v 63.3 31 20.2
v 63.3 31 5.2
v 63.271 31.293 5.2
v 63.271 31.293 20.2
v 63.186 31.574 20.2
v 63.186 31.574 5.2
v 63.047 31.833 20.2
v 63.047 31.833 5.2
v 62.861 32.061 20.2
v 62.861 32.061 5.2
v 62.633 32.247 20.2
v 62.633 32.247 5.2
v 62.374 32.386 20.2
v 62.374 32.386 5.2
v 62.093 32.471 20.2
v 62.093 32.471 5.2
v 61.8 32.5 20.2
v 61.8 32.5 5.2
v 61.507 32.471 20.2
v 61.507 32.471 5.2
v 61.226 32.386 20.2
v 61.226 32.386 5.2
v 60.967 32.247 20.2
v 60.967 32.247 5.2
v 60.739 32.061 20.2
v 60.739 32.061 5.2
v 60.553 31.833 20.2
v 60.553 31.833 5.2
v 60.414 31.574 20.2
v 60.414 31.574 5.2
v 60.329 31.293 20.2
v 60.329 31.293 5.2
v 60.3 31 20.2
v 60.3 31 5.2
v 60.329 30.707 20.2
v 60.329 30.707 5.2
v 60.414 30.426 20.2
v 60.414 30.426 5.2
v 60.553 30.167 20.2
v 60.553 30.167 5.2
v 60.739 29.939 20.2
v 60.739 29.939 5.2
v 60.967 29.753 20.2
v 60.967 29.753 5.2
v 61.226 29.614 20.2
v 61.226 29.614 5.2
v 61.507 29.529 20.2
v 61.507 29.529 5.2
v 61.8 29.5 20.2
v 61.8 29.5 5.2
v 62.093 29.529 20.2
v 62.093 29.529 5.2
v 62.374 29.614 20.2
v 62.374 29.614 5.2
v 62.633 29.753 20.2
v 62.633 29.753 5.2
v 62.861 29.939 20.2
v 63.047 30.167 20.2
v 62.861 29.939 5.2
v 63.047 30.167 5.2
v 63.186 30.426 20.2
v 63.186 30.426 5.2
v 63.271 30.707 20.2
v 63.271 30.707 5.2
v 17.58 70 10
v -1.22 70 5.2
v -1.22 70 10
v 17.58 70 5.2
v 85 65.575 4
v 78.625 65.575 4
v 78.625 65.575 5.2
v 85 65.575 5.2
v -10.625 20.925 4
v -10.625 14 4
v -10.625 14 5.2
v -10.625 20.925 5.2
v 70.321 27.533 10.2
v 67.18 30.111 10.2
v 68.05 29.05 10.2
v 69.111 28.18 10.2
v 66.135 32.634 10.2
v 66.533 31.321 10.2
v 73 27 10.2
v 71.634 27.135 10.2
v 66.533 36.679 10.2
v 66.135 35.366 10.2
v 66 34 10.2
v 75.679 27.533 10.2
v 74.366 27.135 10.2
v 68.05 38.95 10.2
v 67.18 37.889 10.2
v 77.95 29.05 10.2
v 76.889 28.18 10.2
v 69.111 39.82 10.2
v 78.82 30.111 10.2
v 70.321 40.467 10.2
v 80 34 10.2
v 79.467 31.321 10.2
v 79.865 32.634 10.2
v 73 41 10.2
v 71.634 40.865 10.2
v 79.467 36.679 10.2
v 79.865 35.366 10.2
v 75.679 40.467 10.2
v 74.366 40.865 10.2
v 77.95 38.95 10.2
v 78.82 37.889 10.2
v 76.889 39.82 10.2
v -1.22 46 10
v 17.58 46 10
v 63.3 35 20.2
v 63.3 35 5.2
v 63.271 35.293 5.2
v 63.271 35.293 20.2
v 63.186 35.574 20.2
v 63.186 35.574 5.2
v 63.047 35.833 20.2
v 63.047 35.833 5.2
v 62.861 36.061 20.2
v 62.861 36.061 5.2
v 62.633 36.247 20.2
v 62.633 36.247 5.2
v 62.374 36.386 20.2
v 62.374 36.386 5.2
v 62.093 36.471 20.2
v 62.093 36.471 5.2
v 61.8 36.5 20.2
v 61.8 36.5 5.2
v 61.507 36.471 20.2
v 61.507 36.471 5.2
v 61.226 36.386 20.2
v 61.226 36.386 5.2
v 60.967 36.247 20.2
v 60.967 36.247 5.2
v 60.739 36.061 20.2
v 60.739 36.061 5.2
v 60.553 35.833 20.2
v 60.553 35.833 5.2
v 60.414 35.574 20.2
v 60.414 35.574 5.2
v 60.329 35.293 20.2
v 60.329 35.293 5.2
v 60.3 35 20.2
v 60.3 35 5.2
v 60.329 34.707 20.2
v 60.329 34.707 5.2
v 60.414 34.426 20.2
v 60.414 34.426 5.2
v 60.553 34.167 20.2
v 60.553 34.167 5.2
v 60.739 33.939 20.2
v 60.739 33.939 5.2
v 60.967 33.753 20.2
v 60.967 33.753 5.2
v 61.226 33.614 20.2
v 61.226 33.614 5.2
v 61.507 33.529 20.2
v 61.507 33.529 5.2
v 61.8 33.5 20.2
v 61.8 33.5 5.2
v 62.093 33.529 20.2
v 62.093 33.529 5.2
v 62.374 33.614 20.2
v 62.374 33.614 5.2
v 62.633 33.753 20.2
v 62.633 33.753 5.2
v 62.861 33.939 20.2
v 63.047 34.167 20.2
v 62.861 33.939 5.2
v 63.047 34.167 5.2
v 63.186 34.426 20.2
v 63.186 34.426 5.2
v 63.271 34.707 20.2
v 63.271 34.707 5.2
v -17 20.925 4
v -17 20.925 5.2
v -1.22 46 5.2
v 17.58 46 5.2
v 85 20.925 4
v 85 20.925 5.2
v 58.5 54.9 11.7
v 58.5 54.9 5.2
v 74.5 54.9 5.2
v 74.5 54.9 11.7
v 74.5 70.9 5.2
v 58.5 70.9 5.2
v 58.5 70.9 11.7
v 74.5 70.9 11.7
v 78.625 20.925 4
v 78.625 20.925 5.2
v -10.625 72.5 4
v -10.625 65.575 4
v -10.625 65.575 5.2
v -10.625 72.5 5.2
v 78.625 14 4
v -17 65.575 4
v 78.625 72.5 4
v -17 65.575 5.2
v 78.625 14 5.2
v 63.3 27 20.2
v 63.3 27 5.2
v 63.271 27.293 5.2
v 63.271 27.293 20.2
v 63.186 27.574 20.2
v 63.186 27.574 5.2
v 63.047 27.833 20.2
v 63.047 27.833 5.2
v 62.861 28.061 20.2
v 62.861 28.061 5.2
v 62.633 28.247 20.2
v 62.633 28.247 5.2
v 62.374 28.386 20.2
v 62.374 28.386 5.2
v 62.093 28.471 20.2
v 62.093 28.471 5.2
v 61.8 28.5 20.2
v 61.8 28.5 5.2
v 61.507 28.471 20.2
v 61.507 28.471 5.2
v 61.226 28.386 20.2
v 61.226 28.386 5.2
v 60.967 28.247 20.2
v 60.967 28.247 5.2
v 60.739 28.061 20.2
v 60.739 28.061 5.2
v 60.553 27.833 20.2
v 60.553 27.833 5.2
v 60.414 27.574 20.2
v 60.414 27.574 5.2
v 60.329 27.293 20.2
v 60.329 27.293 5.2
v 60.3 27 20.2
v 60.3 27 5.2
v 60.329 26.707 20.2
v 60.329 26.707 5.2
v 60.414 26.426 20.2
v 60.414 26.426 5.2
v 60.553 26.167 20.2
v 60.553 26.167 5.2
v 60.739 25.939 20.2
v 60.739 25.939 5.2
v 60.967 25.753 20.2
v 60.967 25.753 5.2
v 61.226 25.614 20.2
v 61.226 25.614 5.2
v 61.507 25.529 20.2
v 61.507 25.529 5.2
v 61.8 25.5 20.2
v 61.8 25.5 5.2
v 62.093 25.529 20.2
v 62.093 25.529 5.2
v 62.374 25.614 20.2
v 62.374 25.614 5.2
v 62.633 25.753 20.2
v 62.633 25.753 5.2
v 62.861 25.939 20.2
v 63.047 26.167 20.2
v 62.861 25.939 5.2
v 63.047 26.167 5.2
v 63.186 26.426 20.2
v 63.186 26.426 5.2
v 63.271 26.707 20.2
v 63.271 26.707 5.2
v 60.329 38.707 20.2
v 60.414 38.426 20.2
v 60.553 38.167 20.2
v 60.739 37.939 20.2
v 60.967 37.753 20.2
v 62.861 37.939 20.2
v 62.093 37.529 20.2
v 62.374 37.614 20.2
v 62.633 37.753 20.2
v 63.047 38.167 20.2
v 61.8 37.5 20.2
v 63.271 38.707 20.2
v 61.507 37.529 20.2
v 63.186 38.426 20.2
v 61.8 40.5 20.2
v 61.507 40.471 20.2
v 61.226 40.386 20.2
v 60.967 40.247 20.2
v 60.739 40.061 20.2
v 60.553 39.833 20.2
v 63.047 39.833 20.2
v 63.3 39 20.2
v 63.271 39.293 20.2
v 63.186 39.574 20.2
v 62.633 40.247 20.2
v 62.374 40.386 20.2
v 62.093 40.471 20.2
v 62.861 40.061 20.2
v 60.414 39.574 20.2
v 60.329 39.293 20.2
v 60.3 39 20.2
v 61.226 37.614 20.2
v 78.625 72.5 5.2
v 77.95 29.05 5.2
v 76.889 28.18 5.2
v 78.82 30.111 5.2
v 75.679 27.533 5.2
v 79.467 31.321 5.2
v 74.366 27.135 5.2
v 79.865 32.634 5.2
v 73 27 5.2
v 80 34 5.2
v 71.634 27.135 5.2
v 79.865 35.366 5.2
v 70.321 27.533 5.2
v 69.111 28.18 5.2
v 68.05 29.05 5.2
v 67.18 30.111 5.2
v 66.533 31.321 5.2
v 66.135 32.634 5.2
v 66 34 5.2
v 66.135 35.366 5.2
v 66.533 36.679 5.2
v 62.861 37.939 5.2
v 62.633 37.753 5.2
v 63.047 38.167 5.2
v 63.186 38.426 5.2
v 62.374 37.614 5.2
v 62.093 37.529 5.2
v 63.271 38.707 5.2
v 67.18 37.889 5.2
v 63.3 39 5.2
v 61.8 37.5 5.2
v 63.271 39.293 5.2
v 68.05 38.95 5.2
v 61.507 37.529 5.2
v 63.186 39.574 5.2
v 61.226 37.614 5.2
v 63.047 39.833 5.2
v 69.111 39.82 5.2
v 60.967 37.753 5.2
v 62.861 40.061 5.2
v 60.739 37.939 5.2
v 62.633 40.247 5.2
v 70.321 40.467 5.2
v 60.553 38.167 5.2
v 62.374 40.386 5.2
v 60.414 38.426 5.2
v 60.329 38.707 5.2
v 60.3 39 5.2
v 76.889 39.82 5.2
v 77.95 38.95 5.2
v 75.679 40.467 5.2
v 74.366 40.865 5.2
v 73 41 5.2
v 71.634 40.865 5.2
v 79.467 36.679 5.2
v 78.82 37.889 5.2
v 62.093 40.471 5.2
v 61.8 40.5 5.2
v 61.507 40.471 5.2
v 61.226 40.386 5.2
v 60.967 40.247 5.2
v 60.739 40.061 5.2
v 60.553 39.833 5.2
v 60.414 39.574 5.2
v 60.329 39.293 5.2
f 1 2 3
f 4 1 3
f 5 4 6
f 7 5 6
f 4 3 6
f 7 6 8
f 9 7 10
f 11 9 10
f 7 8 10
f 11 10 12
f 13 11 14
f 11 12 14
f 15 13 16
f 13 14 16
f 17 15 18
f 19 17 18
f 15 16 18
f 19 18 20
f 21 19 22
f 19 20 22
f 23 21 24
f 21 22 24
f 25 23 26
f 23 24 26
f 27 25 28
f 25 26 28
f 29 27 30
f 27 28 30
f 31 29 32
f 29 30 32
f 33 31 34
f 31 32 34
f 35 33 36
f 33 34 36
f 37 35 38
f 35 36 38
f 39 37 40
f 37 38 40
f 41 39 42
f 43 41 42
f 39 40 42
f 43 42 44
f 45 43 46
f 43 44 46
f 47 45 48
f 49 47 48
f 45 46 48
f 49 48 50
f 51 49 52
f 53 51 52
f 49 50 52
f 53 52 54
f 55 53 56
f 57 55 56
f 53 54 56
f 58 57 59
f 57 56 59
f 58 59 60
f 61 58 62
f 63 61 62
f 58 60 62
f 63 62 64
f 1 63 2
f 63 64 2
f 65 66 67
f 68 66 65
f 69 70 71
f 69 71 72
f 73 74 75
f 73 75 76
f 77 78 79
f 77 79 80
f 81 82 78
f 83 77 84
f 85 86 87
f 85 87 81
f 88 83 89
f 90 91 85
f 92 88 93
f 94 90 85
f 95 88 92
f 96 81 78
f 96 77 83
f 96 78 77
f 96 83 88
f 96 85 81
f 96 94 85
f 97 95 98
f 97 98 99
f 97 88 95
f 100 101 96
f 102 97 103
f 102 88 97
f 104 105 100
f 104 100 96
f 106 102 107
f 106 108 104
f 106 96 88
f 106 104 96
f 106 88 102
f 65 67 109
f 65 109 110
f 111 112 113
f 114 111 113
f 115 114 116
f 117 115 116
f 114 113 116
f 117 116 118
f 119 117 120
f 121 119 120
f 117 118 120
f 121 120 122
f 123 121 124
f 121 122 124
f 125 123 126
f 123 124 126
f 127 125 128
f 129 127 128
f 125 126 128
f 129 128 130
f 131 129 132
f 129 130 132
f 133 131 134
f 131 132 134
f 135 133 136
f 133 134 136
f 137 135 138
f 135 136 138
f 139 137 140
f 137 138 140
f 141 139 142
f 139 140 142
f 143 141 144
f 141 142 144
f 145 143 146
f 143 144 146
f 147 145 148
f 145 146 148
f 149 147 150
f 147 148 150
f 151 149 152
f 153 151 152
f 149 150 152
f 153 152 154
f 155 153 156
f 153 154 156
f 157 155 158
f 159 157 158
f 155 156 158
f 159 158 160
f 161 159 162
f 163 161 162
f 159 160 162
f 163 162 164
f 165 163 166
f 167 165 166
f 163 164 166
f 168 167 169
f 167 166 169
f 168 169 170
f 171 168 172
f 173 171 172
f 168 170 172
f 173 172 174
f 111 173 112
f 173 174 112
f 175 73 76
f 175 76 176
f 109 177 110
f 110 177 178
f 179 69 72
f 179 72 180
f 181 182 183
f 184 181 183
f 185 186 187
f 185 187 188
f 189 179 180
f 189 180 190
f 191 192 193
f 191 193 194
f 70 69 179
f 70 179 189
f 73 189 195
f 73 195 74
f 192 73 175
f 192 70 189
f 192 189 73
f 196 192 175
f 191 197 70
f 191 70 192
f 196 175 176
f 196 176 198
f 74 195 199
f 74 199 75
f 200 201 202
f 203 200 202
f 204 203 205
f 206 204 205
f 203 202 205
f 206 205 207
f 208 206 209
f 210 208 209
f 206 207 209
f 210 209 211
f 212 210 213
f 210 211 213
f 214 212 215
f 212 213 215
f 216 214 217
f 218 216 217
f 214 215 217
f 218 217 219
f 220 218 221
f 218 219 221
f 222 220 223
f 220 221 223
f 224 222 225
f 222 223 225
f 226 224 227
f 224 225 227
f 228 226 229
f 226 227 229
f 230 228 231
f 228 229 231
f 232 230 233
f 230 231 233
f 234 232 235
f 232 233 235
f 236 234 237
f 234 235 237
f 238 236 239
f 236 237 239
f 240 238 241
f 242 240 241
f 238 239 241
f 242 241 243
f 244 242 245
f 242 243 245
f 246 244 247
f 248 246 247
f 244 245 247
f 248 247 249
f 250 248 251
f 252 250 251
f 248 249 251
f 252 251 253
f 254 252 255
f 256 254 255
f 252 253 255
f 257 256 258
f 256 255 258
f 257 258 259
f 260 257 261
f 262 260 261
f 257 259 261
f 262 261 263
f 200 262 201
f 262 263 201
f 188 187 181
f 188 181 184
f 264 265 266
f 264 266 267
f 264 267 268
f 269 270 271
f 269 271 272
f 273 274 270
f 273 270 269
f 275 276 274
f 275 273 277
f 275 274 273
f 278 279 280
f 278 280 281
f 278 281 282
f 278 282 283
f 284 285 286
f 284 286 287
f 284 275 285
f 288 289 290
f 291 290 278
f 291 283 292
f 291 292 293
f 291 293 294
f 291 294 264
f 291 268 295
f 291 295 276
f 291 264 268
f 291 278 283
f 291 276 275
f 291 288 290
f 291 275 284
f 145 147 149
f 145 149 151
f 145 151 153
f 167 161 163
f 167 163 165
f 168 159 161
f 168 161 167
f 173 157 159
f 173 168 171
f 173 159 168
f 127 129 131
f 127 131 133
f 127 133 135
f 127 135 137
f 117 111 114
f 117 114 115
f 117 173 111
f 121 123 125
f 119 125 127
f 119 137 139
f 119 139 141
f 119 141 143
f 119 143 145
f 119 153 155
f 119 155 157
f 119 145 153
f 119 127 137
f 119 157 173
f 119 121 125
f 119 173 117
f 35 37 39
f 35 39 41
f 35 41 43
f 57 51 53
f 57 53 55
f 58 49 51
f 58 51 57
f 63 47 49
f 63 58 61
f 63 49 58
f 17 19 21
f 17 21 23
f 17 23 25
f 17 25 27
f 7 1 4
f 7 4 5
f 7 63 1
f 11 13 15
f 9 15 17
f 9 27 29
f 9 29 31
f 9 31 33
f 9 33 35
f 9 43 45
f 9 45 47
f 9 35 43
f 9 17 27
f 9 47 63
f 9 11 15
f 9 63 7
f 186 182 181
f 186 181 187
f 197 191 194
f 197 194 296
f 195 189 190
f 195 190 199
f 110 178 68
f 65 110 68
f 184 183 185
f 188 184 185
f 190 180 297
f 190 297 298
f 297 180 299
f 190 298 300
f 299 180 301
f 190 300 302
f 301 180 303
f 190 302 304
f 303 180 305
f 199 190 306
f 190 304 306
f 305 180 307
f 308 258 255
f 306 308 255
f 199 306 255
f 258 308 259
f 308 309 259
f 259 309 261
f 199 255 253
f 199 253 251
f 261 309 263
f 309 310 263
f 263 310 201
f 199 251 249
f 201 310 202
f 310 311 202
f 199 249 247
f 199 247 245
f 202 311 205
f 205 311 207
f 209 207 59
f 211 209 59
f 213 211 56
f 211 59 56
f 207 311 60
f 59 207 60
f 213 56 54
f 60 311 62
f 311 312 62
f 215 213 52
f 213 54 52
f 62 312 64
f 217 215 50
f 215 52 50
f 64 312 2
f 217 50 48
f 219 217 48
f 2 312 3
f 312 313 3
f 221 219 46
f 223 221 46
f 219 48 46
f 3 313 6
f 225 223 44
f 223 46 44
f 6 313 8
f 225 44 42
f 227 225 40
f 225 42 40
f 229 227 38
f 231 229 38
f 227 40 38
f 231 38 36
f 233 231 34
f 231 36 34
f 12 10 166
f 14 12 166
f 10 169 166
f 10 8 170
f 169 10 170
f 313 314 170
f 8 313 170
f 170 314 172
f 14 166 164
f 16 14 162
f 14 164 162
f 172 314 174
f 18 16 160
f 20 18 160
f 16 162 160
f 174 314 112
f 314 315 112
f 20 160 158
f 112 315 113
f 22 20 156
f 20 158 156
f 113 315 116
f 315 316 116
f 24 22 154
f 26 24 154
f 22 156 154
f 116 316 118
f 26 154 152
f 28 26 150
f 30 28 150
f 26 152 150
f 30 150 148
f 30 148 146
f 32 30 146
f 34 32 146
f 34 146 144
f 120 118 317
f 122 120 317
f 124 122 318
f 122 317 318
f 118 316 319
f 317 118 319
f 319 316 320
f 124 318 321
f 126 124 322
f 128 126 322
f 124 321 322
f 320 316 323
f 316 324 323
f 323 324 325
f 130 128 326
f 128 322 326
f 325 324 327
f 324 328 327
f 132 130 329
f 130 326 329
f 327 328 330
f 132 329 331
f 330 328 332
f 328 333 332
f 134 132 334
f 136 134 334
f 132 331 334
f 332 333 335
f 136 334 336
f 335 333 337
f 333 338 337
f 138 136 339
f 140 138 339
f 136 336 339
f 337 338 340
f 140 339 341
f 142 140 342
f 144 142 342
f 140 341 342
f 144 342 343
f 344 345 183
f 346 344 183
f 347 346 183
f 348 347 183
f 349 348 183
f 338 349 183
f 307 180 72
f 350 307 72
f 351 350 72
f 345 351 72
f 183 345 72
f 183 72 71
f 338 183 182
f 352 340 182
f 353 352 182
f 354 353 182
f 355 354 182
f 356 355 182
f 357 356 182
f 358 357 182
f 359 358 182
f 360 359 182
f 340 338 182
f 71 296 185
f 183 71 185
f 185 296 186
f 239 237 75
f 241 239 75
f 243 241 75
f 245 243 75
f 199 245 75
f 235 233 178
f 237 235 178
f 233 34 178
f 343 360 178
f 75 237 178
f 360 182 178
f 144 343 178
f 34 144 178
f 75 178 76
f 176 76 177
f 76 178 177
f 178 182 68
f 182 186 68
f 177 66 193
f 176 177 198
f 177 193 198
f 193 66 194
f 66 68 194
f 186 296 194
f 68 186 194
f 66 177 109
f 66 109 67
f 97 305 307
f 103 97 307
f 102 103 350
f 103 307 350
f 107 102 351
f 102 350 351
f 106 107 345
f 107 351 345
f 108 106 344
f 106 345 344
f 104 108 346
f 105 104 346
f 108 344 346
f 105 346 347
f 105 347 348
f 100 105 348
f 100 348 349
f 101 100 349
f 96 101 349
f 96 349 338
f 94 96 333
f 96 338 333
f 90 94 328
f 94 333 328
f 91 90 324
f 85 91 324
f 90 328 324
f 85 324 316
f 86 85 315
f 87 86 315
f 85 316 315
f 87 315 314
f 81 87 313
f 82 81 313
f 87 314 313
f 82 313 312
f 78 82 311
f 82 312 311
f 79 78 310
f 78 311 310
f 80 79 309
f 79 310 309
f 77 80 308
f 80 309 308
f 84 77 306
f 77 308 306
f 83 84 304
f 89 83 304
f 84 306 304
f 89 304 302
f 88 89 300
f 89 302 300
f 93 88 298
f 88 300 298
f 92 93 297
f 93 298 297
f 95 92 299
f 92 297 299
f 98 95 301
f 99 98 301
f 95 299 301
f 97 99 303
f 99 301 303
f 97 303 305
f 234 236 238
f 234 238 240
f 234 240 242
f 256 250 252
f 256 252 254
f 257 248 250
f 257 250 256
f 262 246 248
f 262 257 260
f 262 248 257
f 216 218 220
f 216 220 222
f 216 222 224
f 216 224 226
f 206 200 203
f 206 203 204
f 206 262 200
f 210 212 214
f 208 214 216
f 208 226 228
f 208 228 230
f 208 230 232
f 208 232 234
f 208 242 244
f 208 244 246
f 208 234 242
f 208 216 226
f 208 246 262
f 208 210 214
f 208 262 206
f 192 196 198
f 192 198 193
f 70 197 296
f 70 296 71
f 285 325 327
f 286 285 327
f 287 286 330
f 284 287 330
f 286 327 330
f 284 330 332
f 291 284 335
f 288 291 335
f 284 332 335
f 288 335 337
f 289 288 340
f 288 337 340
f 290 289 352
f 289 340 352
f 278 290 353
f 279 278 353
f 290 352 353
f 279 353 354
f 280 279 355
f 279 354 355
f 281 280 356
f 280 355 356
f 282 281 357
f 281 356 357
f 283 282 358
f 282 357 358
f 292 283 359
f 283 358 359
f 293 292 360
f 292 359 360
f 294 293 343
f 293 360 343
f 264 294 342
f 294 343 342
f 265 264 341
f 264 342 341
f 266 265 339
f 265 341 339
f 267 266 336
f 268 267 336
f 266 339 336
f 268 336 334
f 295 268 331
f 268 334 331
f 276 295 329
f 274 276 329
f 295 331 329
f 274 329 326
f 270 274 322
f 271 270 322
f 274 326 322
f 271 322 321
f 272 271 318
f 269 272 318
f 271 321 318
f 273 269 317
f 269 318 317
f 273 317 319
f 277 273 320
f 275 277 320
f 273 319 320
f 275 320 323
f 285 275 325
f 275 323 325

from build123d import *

# Parameters (mm, degrees)
PAD001_DEPTH = 1.2
SKETCH007_W  = 16
SKETCH007_H  = 16
PAD002_DEPTH = 6.5
SKETCH008_R  = 1.5
PAD003_DEPTH = 15
SKETCH009_R  = 7
PAD004_DEPTH = 5
SKETCH010_W  = 18.8
SKETCH010_H  = 24
PAD005_DEPTH = 4.8


with BuildPart() as part:
    # Sketch006 → Pad001 (new body)
    with BuildSketch(Plane.XY):
        Polygon((-10.625, 72.5), (78.625, 72.5), (78.625, 65.575), (85, 65.575), (85, 20.925), (78.625, 20.925), (78.625, 14), (-10.625, 14), (-10.625, 20.925), (-17, 20.925), (-17, 65.575), (-10.625, 65.575), align=None)
    extrude(amount=PAD001_DEPTH)

    # Sketch007 (on Face14 of Pad001) → Pad002 (join)
    with BuildSketch(Plane.XY.offset(1.2)):
        with Locations((66.5, 62.9)):
            Rectangle(SKETCH007_W, SKETCH007_H)
    extrude(amount=PAD002_DEPTH)

    # Sketch008 (on Face5 of Pad002) → Pad003 (join)
    with BuildSketch(Plane.XY.offset(1.2)):
        with Locations((61.8, 39)):
            Circle(SKETCH008_R)
        with Locations((61.8, 35)):
            Circle(SKETCH008_R)
        with Locations((61.8, 31)):
            Circle(SKETCH008_R)
        with Locations((61.8, 27)):
            Circle(SKETCH008_R)
    extrude(amount=PAD003_DEPTH)

    # Sketch009 (on Face5 of Pad003) → Pad004 (join)
    with BuildSketch(Plane.XY.offset(1.2)):
        with Locations((73, 34)):
            Circle(SKETCH009_R)
    extrude(amount=PAD004_DEPTH)

    # Sketch010 (on Face5 of Pad004) → Pad005 (join)
    with BuildSketch(Plane.XY.offset(1.2)):
        with Locations((8.18, 58)):
            Rectangle(SKETCH010_W, SKETCH010_H)
    extrude(amount=PAD005_DEPTH)


with BuildPart() as part_1:
    # Body004 placement: moved
    add(part.part.moved(Location((0, 0, 4))))


solid = part_1.part
